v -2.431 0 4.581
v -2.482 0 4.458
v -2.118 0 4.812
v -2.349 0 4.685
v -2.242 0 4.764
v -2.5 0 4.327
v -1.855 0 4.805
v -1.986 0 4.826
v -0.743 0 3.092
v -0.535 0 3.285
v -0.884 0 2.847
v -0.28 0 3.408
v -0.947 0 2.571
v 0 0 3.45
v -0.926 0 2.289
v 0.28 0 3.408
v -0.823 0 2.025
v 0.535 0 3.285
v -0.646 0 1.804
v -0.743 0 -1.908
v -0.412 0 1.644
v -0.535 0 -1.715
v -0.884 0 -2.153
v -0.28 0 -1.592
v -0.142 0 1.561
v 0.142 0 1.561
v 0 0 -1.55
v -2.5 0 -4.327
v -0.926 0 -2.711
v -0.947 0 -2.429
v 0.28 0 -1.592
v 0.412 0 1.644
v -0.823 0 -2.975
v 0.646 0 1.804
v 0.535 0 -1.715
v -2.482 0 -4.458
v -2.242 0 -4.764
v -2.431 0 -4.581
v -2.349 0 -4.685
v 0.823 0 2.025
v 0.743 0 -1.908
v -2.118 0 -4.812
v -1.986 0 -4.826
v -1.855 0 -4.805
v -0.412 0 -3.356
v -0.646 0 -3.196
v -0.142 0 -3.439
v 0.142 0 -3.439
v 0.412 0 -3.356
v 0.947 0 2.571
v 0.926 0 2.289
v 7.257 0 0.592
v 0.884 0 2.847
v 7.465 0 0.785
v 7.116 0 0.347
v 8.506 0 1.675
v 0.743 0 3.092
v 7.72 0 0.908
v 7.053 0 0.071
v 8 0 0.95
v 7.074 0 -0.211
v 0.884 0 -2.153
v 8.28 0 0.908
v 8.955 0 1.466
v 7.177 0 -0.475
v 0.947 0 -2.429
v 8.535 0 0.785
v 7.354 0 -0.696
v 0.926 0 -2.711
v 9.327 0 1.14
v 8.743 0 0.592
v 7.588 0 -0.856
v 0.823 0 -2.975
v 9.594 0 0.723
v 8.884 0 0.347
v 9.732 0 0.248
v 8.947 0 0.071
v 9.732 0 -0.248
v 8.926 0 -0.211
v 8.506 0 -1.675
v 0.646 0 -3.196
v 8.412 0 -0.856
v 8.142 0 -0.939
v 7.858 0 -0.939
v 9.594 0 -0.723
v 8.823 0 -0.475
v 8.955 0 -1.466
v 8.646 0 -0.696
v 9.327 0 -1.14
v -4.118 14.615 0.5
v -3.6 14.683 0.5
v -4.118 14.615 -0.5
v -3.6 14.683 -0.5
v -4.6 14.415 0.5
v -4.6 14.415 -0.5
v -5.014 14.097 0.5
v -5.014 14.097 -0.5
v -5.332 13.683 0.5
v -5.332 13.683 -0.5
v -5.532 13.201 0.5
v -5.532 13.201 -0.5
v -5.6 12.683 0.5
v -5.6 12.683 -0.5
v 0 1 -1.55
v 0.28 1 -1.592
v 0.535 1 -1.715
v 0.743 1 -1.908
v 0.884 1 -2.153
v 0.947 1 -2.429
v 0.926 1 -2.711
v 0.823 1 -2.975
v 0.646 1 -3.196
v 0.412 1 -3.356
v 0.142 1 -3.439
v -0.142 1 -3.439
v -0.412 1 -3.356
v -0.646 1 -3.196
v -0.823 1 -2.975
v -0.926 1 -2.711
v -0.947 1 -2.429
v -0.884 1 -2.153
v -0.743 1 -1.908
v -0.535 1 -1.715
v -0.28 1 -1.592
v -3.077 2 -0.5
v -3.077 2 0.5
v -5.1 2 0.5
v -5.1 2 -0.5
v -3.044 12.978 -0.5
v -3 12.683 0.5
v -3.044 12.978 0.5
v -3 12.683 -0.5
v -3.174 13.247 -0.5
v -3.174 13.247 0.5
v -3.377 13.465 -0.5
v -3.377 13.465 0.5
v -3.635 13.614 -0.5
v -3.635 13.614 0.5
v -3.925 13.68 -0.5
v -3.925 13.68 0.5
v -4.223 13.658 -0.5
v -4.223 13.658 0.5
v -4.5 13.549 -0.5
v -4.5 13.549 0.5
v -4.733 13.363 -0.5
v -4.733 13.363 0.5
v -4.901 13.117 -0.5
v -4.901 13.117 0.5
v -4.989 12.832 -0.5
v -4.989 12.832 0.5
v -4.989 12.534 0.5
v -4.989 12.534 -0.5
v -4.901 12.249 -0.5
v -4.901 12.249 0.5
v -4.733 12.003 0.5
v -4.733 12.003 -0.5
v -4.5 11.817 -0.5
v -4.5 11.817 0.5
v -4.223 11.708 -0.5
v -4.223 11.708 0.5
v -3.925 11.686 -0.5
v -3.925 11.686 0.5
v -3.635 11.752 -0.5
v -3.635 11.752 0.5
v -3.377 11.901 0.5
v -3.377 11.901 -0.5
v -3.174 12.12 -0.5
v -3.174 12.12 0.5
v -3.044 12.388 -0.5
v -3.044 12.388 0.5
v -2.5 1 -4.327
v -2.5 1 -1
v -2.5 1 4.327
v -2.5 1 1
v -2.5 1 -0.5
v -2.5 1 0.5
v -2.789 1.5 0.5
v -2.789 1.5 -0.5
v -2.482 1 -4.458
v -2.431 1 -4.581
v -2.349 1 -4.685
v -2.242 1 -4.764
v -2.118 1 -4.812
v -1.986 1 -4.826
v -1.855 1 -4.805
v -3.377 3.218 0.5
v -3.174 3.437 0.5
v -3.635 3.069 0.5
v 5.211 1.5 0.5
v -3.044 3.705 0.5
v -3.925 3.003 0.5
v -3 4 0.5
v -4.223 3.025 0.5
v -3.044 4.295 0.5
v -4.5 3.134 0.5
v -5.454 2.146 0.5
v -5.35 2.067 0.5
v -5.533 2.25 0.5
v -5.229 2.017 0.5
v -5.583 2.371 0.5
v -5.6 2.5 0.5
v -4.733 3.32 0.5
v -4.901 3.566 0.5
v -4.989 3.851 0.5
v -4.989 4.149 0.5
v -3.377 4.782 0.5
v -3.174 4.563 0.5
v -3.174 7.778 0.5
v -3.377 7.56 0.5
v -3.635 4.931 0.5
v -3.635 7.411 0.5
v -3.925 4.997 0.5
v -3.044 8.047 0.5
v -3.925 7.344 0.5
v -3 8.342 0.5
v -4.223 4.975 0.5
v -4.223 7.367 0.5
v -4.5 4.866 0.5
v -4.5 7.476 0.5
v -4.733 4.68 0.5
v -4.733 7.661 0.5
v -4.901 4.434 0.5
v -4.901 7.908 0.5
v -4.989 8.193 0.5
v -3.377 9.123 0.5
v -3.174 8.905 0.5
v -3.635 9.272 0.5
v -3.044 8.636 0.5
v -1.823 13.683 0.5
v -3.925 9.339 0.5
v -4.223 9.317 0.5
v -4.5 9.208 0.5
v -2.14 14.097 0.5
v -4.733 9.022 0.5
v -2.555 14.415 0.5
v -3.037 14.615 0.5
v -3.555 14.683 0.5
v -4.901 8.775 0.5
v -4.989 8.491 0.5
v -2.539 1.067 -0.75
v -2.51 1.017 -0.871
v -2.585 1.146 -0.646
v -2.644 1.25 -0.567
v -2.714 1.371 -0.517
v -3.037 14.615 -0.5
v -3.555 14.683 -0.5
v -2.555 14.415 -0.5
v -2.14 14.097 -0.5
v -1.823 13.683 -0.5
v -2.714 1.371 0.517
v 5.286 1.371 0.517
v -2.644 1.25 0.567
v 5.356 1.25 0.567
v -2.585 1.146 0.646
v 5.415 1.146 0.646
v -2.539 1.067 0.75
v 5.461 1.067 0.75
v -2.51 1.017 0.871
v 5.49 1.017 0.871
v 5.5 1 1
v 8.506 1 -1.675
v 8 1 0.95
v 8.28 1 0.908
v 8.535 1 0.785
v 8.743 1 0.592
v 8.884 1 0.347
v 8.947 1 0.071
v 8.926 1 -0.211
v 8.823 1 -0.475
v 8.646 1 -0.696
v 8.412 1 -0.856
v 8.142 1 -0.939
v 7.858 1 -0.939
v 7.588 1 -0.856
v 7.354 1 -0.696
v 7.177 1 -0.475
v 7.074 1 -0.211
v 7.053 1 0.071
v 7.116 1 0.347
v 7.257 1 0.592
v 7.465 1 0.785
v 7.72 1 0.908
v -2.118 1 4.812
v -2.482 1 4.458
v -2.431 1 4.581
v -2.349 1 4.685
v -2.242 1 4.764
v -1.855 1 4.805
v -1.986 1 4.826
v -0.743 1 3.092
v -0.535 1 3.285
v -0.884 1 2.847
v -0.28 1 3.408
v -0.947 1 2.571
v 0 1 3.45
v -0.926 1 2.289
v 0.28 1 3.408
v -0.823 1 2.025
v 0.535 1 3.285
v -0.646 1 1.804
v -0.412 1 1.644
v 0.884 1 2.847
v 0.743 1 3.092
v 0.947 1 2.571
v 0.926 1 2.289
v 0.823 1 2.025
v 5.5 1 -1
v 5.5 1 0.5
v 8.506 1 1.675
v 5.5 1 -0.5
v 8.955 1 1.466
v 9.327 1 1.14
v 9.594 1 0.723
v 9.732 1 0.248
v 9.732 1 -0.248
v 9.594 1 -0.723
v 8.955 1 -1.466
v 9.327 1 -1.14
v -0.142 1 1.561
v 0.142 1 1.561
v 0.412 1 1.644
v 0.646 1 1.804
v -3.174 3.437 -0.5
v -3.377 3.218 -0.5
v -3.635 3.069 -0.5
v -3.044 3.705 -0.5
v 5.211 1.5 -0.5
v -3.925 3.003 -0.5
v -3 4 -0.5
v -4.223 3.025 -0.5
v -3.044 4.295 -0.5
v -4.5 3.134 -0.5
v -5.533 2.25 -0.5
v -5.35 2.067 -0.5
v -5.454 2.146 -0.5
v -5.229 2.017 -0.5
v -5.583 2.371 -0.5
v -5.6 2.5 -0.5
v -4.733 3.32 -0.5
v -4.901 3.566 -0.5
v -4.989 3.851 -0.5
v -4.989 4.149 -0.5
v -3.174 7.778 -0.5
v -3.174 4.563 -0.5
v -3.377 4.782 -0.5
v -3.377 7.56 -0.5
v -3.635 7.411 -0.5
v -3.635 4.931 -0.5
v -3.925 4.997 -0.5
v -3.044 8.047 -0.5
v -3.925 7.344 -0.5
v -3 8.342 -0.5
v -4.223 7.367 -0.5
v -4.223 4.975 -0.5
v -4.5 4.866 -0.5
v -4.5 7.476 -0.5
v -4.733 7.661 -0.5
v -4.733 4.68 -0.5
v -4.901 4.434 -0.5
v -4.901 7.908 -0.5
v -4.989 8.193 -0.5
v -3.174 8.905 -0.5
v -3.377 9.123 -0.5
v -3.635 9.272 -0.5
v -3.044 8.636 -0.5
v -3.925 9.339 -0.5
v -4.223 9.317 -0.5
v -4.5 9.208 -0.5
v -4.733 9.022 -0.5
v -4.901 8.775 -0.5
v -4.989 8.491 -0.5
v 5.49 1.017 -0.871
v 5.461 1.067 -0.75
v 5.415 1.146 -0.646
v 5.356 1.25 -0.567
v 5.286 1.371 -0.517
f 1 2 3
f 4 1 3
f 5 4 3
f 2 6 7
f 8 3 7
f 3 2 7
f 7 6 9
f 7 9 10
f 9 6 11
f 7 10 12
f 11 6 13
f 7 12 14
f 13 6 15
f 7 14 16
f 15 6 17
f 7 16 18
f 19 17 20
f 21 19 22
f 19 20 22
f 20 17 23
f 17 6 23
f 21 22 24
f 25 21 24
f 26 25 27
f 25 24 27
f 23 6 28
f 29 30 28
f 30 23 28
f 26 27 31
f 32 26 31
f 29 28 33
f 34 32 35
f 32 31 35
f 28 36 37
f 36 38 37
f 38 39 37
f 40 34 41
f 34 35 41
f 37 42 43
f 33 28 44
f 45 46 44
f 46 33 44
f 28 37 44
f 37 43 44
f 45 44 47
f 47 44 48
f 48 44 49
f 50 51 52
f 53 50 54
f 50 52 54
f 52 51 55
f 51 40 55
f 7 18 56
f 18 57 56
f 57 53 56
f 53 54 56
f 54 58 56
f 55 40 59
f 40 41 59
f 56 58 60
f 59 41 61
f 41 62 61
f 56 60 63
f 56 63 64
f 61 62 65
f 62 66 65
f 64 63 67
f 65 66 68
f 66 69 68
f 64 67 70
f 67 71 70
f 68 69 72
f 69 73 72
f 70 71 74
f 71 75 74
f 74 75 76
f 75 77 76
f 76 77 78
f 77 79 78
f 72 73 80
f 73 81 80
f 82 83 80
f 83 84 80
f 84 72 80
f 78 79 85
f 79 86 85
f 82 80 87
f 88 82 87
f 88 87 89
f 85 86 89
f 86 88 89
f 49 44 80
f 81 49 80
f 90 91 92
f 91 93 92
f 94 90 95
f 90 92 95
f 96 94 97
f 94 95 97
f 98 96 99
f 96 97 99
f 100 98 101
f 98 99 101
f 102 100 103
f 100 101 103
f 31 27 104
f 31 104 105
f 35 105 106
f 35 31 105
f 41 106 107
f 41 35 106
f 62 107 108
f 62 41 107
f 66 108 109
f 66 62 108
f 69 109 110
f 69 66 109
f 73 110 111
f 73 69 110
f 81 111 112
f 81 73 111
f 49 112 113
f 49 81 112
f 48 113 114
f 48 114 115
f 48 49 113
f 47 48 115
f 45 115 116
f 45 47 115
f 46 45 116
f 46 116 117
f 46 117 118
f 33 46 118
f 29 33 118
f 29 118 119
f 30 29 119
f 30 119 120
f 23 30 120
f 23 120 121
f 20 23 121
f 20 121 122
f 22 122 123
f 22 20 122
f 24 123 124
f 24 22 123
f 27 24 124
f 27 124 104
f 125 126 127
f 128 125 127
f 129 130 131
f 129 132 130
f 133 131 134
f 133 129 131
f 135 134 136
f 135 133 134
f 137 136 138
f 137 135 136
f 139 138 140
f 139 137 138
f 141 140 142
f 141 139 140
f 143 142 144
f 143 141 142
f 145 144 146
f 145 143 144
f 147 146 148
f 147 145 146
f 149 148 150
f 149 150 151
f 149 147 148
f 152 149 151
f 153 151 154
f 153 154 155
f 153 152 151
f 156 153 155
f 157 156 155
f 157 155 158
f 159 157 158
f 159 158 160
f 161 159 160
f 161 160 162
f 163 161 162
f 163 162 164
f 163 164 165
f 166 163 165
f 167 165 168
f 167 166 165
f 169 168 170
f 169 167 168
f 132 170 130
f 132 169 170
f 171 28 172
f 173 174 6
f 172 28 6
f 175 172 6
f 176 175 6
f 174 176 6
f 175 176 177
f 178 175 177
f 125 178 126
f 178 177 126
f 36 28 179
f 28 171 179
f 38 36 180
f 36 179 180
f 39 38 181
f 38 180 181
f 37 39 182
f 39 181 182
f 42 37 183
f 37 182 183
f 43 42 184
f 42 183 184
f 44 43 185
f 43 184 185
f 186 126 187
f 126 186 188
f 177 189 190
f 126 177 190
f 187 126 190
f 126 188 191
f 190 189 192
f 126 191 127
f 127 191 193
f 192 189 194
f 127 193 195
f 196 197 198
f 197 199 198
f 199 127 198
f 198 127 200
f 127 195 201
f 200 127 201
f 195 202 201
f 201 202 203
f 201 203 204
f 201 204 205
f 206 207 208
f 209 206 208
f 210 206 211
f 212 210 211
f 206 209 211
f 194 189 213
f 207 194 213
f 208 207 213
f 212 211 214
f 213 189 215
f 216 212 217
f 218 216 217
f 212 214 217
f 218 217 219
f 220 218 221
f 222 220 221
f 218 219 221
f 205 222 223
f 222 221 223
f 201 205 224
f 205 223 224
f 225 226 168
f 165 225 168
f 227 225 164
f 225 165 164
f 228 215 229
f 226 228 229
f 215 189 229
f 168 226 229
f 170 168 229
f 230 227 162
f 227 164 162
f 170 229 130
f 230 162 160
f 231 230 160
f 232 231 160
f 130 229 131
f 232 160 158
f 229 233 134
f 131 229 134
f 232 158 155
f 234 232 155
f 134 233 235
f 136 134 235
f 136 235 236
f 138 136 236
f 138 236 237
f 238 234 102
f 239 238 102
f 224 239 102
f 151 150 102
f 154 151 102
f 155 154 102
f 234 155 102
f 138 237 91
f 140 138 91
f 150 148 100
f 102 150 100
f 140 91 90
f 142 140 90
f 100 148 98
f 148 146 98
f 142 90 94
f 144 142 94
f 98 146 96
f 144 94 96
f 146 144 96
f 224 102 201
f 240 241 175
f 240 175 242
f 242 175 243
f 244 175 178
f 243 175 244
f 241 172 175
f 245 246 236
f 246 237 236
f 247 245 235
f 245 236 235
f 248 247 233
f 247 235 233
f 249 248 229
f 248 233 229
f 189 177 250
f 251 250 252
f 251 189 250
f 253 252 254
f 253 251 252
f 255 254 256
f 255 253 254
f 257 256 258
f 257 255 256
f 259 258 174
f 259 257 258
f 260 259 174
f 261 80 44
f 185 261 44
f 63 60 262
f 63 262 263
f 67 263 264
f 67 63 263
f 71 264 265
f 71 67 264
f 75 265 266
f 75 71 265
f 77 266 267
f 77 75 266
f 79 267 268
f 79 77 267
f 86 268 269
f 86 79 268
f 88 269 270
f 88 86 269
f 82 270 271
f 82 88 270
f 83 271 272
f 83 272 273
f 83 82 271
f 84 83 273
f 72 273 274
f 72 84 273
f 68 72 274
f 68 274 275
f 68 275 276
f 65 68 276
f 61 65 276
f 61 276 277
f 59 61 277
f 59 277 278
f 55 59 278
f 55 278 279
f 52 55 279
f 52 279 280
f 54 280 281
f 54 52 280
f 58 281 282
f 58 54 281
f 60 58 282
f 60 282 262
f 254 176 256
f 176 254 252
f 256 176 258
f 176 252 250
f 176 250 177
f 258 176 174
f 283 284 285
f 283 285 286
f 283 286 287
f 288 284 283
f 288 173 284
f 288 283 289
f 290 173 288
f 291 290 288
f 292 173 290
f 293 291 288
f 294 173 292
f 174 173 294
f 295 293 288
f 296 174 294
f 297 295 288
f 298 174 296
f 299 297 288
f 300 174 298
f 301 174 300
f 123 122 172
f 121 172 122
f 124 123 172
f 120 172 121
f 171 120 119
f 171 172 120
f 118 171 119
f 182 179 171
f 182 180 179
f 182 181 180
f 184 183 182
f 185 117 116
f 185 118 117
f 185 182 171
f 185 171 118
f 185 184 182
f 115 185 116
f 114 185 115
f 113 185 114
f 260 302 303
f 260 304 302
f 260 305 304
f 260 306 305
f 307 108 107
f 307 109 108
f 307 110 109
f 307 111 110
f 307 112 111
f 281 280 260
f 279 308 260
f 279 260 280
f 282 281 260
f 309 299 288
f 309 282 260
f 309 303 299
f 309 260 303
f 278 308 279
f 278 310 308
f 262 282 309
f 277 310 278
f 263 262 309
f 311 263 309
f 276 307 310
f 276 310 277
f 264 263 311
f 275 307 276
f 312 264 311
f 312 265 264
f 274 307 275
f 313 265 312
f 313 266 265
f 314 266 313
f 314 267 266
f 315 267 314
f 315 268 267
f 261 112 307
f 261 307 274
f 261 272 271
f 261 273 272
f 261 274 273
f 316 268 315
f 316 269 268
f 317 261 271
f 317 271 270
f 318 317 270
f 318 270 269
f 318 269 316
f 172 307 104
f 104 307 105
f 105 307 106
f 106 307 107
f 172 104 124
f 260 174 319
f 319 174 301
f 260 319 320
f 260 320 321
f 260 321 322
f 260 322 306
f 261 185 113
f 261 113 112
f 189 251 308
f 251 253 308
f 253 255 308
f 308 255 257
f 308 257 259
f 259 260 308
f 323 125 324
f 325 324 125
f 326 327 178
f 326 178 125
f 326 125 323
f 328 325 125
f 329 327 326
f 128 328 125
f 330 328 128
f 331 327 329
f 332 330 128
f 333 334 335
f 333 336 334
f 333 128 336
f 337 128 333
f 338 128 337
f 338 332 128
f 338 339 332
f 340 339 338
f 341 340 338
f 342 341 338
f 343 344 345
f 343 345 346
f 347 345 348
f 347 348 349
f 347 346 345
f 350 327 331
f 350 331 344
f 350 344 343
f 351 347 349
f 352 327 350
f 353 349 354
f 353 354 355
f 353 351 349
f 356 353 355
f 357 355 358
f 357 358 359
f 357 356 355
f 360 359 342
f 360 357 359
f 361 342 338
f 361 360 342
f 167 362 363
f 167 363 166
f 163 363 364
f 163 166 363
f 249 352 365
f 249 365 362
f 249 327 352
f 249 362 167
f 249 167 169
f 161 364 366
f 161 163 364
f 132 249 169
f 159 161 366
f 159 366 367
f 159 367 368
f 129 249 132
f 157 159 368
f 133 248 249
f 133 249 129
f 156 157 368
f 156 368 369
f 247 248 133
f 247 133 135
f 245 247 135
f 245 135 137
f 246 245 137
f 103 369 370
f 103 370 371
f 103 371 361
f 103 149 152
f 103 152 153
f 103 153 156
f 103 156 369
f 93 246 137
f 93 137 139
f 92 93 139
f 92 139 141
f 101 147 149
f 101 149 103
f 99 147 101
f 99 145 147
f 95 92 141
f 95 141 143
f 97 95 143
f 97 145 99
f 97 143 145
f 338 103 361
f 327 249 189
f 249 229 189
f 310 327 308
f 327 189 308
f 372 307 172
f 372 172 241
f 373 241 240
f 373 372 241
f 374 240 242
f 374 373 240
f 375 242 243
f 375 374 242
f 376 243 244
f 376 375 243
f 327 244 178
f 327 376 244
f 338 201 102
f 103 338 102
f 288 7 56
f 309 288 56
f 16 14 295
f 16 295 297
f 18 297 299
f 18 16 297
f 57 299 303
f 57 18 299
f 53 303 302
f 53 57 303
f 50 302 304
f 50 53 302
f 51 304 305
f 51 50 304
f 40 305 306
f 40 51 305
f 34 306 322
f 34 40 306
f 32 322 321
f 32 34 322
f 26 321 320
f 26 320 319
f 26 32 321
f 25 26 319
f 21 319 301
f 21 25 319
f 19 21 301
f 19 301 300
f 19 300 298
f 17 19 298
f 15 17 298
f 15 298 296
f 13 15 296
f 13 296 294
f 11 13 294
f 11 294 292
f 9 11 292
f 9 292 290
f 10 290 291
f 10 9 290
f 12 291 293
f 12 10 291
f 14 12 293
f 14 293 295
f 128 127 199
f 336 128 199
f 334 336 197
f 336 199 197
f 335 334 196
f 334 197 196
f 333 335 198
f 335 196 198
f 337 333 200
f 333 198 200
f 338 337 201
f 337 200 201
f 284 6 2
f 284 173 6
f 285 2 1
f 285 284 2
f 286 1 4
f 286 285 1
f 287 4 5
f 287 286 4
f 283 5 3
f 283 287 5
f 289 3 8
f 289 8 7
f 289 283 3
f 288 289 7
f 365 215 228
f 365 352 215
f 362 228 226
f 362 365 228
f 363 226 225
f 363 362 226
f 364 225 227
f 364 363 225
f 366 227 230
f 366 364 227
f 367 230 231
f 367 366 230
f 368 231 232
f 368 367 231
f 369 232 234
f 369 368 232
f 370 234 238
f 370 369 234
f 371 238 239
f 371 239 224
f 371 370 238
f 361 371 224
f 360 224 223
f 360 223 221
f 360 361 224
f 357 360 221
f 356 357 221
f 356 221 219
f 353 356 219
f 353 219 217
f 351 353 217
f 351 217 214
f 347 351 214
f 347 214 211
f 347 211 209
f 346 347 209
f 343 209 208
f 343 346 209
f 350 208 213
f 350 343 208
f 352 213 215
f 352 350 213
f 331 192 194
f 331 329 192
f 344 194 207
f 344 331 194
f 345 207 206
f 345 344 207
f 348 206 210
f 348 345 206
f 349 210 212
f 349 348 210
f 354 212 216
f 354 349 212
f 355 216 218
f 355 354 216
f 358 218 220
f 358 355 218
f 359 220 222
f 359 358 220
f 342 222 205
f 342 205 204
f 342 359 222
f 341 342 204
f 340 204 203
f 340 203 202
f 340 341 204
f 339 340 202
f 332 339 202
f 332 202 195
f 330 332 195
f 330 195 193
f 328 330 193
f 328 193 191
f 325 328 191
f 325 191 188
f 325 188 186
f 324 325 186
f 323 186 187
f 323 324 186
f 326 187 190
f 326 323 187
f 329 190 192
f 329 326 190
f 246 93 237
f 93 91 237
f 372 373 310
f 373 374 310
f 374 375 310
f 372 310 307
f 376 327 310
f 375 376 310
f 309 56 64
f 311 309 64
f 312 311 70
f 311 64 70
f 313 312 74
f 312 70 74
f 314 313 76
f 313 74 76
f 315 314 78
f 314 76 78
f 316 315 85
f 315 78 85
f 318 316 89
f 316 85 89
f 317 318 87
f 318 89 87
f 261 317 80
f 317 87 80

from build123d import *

# Parameters (mm, degrees)
IZIM1_R                     = 0.95
Y_KSEKLIK_EKSTR_ZYON1_DEPTH = 1
RADYUS1_R                   = 0.5
IZIM2_R                     = 1
Y_KSEKLIK_EKSTR_ZYON2_DEPTH = 0.5
RADYUS2_R                   = 0.5
RADYUS3_R                   = 2


with BuildPart() as part:
    # Çizim1 → Yükseklik-Ekstrüzyon1 (new body)
    with BuildSketch(Plane(origin=(0, 0, 0), x_dir=(1, 0, 0), z_dir=(0, 1, 0))):
        with BuildLine():
            Line((-2.5, 5), (-2.5, -5))
            Line((-2.5, -5), (8.506062625, -1.675231512))
            ThreePointArc((8.506062625, -1.675231512), (9.75, 0), (8.506062625, 1.675231512))
            Line((8.506062625, 1.675231512), (-2.5, 5))
        make_face()
        with Locations(Location((0, 2.5, 0), (0, 0, 270))):
            Circle(IZIM1_R, mode=Mode.SUBTRACT)
        with Locations(Location((0, -2.5, 0), (0, 0, 270))):
            Circle(IZIM1_R, mode=Mode.SUBTRACT)
        with Locations(Location((8, 0, 0), (0, 0, 270))):
            Circle(IZIM1_R, mode=Mode.SUBTRACT)
    extrude(amount=Y_KSEKLIK_EKSTR_ZYON1_DEPTH)

    # Radyus1
    radyus1_edges = [part.edges().sort_by_distance(p)[0] for p in [
        (-2.5, 0.5, 5),
        (-2.5, 0.5, -5),
    ]]
    fillet(radyus1_edges, radius=RADYUS1_R)

    # Çizim2 → Yükseklik-Ekstrüzyon2 (add, symmetric)
    with BuildSketch(Plane.XY):
        Polygon((-2.5, 1), (-3.077350269, 2), (-5.6, 2), (-5.6, 14.68320138), (-2.4, 14.68320138), (5.5, 1), align=None)
        with Locations((-4, 4)):
            Circle(IZIM2_R, mode=Mode.SUBTRACT)
        with Locations((-4, 12.68320138)):
            Circle(IZIM2_R, mode=Mode.SUBTRACT)
        with Locations((-4, 8.34160069)):
            Circle(IZIM2_R, mode=Mode.SUBTRACT)
    extrude(amount=Y_KSEKLIK_EKSTR_ZYON2_DEPTH, both=True)

    # Radyus2
    # the kernel refuses this fillet: 0.5 mm, written as the material it adds along each edge
    with BuildSketch(Plane(origin=(6.75, 1, 0.5), x_dir=(0, 0, 1), z_dir=(-1, 0, 0))) as radyus2_piece_1_section:
        with BuildLine():
            CenterArc((RADYUS2_R, RADYUS2_R), RADYUS2_R, 180, 90)
            Line((0, RADYUS2_R), (0, 0))
            Line((0, 0), (RADYUS2_R, 0))
        make_face()
    radyus2_piece_1 = extrude(amount=9.25, mode=Mode.PRIVATE)
    radyus2_piece_1 = split(radyus2_piece_1, bisect_by=Plane(origin=(4.44326915, 2.830311522, 0.613693195), z_dir=(-0.8660254037844398, -0.49999999999999806, 0)), keep=Keep.TOP, mode=Mode.PRIVATE)
    radyus2_piece_1 = split(radyus2_piece_1, bisect_by=Plane(origin=(-1.55673085, -0.633790093, 0.613693195), z_dir=(0.8660254037844397, 0.4999999999999983, 0)), keep=Keep.TOP, mode=Mode.PRIVATE)
    add(radyus2_piece_1)
    with BuildSketch(Plane(origin=(6.75, 1, 0.5), x_dir=(0, 0, 1), z_dir=(-1, 0, 0))) as radyus2_piece_2_section:
        with BuildLine():
            CenterArc((RADYUS2_R, RADYUS2_R), RADYUS2_R, 180, 90)
            Line((0, RADYUS2_R), (0, 0))
            Line((0, 0), (RADYUS2_R, 0))
        make_face()
    radyus2_piece_2 = extrude(amount=10.5, mode=Mode.PRIVATE)
    radyus2_piece_2 = split(radyus2_piece_2, bisect_by=Plane(origin=(-2.5, 1.215059026, 0.553236256), z_dir=(-1, 0, 0)), keep=Keep.TOP, mode=Mode.PRIVATE)
    radyus2_piece_2 = split(radyus2_piece_2, bisect_by=Plane(origin=(-2.608643838, 1.188176648, 0.553236256), z_dir=(0.8660254037844397, 0.4999999999999983, 0)), keep=Keep.TOP, mode=Mode.PRIVATE)
    add(radyus2_piece_2)
    with BuildSketch(Plane(origin=(6.75, 1, -0.5), x_dir=(0, 0, -1), z_dir=(-1, 0, 0))) as radyus2_piece_3_section:
        with BuildLine():
            CenterArc((RADYUS2_R, -RADYUS2_R), RADYUS2_R, 90, 90)
            Line((0, -RADYUS2_R), (0, 0))
            Line((0, 0), (RADYUS2_R, 0))
        make_face()
    radyus2_piece_3 = extrude(amount=9.25, mode=Mode.PRIVATE)
    radyus2_piece_3 = split(radyus2_piece_3, bisect_by=Plane(origin=(4.44326915, 2.830311522, -0.613693195), z_dir=(-0.8660254037844398, -0.49999999999999806, 0)), keep=Keep.TOP, mode=Mode.PRIVATE)
    radyus2_piece_3 = split(radyus2_piece_3, bisect_by=Plane(origin=(-1.55673085, -0.633790093, -0.613693195), z_dir=(0.8660254037844397, 0.4999999999999983, 0)), keep=Keep.TOP, mode=Mode.PRIVATE)
    add(radyus2_piece_3)
    with BuildSketch(Plane(origin=(6.75, 1, -0.5), x_dir=(0, 0, -1), z_dir=(-1, 0, 0))) as radyus2_piece_4_section:
        with BuildLine():
            CenterArc((RADYUS2_R, -RADYUS2_R), RADYUS2_R, 90, 90)
            Line((0, -RADYUS2_R), (0, 0))
            Line((0, 0), (RADYUS2_R, 0))
        make_face()
    radyus2_piece_4 = extrude(amount=10.5, mode=Mode.PRIVATE)
    radyus2_piece_4 = split(radyus2_piece_4, bisect_by=Plane(origin=(-2.5, 1.215059026, -0.553236256), z_dir=(-1, 0, 0)), keep=Keep.TOP, mode=Mode.PRIVATE)
    radyus2_piece_4 = split(radyus2_piece_4, bisect_by=Plane(origin=(-2.608643838, 1.188176648, -0.553236256), z_dir=(0.8660254037844397, 0.4999999999999983, 0)), keep=Keep.TOP, mode=Mode.PRIVATE)
    add(radyus2_piece_4)
    # the kernel refuses this fillet: 0.5 mm, written as the material it takes off along each edge
    with BuildSketch(Plane(origin=(-5.6, 2, 1.75), x_dir=(0, 1, 0), z_dir=(0, 0, -1))) as radyus2_2_piece_1:
        with BuildLine():
            CenterArc((RADYUS2_R, RADYUS2_R), RADYUS2_R, 180, 90)
            Line((0, RADYUS2_R), (0, 0))
            Line((0, 0), (RADYUS2_R, 0))
        make_face()
    extrude(amount=3.5, mode=Mode.SUBTRACT)

    # Radyus3
    radyus3_edges = [part.edges().sort_by_distance(p)[0] for p in [
        (-5.6, 14.68320138, 0),
        (-2.4, 14.68320138, 0),
    ]]
    fillet(radyus3_edges, radius=RADYUS3_R)


solid = part.part
